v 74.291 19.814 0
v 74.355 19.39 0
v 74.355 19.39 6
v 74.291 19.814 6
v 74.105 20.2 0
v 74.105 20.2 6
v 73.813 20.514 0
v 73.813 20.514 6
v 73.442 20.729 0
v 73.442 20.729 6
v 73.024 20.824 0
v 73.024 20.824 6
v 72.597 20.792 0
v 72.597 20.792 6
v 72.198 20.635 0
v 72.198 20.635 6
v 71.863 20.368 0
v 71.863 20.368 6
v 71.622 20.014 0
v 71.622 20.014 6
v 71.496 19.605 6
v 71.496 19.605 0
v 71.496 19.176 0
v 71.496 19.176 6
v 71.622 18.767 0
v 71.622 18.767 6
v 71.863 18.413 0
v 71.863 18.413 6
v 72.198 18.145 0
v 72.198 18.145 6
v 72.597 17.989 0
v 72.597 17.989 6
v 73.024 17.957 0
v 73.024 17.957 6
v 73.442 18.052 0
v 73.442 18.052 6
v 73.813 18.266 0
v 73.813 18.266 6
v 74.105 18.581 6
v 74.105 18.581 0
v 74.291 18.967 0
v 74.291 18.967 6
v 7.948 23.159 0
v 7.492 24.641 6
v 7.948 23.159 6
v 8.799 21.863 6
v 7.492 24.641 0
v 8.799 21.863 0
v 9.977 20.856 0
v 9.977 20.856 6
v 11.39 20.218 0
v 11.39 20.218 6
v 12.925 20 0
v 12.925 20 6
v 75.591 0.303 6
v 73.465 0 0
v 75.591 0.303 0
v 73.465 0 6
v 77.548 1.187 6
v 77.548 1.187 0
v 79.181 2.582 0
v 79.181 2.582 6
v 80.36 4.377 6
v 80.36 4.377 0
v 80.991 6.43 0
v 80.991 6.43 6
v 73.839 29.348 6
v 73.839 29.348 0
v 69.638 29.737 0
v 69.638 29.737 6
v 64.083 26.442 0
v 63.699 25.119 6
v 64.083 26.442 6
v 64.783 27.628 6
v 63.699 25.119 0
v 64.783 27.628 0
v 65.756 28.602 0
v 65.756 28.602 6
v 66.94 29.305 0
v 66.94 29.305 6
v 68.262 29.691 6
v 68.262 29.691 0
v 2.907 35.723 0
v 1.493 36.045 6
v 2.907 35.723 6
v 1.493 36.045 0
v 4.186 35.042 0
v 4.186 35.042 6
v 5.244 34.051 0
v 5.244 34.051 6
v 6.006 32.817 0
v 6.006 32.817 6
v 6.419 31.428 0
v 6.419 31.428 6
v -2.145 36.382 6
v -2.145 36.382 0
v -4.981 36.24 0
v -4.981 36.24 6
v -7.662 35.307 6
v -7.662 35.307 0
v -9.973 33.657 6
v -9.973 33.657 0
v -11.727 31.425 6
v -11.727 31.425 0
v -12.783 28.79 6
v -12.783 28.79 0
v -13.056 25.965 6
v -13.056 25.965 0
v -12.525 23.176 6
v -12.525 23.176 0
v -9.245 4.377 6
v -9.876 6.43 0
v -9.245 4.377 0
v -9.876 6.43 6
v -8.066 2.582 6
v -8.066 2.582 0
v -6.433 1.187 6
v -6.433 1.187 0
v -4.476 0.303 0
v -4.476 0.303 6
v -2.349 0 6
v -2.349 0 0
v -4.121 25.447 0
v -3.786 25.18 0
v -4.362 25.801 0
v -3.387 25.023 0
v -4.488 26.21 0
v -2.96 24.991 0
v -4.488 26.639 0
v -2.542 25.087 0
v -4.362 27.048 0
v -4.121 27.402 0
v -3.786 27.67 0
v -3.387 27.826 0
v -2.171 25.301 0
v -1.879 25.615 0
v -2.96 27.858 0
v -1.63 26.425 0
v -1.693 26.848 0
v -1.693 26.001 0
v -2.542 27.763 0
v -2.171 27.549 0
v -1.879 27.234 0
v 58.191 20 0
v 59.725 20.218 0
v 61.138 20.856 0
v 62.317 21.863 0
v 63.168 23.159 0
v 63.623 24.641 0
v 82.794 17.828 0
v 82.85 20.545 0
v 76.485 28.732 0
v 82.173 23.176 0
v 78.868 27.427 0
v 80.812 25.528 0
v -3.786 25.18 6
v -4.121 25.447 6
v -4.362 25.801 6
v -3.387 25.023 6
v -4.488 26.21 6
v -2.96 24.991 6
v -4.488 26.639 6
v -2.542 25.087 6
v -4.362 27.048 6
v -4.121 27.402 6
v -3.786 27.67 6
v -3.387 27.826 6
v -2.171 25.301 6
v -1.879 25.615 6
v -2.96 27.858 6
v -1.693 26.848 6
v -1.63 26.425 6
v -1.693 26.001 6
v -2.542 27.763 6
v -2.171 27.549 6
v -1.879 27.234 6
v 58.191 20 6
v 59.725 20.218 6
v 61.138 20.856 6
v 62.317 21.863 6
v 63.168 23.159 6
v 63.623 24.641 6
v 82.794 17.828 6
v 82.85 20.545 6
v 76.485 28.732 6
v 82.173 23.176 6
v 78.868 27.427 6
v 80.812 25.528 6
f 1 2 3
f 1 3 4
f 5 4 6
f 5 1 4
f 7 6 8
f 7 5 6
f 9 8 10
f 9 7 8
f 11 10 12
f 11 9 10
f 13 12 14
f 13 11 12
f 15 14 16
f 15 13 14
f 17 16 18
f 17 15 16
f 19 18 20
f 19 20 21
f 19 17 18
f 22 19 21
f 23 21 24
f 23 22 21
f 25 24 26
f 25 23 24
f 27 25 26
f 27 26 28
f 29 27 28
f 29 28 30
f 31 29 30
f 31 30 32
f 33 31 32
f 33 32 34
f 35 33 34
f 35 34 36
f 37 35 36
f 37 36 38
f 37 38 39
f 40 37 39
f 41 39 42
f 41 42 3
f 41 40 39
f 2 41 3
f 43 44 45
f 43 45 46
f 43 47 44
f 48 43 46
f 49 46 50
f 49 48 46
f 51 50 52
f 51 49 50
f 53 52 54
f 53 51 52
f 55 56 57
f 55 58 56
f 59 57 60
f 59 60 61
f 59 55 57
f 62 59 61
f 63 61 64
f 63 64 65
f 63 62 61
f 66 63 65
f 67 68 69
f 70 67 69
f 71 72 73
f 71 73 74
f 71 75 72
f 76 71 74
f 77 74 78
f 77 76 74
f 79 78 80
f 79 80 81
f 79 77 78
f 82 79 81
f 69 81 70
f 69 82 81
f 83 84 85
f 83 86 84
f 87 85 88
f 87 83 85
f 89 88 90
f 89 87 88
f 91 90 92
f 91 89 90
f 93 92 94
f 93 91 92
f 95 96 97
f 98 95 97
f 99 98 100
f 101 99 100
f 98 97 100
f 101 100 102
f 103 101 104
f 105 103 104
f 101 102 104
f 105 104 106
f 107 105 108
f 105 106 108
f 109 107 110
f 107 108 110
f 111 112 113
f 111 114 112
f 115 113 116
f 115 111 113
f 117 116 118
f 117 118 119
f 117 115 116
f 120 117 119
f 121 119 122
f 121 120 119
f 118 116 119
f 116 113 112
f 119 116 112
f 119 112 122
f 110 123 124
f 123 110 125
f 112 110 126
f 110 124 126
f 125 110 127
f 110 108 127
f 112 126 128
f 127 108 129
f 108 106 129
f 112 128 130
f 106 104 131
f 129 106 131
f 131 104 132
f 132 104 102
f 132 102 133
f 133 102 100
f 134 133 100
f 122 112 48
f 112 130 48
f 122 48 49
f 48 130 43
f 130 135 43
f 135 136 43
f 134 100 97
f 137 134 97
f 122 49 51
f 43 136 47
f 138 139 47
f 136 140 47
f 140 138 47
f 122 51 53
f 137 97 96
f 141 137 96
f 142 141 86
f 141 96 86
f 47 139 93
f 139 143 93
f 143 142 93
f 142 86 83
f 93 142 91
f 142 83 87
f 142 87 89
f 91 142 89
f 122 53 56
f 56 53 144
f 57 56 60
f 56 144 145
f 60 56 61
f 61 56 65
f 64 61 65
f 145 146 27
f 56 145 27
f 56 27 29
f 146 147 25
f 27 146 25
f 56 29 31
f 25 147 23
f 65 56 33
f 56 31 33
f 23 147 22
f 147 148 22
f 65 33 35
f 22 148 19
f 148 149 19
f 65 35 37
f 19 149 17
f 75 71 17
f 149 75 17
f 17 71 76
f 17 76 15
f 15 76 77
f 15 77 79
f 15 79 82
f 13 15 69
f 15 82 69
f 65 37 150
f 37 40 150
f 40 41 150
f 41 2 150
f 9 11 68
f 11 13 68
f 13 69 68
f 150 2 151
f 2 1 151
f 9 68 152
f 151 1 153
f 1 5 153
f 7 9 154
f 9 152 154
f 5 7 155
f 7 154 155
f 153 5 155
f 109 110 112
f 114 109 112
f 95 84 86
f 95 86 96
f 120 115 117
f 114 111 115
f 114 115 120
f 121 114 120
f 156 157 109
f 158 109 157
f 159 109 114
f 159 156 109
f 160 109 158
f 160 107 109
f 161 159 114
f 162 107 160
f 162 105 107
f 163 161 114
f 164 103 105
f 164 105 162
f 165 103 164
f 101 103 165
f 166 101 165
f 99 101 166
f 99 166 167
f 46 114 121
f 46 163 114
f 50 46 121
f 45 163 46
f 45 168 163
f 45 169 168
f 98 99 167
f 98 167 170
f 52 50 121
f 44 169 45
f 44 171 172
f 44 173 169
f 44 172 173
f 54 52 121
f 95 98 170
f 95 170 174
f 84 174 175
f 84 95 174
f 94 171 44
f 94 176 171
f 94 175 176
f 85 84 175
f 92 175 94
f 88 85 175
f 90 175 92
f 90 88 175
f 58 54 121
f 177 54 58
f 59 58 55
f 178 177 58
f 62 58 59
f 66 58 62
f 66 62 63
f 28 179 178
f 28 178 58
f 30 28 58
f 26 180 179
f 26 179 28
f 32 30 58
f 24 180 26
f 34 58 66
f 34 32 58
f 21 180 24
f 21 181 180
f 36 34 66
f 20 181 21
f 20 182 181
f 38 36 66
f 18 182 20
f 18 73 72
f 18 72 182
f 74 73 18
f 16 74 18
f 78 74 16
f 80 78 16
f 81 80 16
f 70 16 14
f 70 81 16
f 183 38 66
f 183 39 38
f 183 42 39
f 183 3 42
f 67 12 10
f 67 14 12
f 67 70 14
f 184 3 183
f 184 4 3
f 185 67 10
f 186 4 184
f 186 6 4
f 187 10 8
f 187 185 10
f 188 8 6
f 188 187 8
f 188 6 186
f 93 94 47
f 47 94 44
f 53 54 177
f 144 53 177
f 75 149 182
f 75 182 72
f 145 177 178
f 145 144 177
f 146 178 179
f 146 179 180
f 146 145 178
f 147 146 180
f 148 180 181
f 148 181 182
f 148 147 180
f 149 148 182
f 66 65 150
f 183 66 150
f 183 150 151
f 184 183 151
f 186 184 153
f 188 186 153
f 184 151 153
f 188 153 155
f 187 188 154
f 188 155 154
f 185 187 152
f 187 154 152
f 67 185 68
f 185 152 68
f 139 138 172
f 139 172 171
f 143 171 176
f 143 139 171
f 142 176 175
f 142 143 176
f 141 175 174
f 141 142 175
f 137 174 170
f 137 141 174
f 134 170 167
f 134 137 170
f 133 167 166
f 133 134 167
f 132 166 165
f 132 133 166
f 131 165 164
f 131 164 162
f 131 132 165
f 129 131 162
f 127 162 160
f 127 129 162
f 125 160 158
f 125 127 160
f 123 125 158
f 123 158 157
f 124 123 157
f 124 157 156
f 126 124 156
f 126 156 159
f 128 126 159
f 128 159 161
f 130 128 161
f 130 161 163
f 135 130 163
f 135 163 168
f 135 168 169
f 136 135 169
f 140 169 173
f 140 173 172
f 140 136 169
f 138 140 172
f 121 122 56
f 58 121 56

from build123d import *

# Parameters (mm, degrees)
SKETCH1_R           = 1.4375
BOSS_EXTRUDE1_DEPTH = 5.999988
FILLET3_R           = 7.62
CUT_EXTRUDE2_DEPTH  = 91.763371988
FILLET5_R           = 5.5


with BuildPart() as part:
    # Sketch1 → Boss-Extrude1 (new body)
    # profile 1 of 2: a face of its own
    with BuildSketch(Plane.XY):
        with BuildLine():
            Line((-12.524548321, 23.175850862), (-8.858779162, 0))
            Line((-8.858779162, 0), (79.974319043, 0))
            Line((79.974319043, 0), (82.794220418, 17.828076701))
            ThreePointArc((82.794220418, 17.828076701), (80.81199482, 25.527902595), (73.838835056, 29.347795267))
            Line((73.838835056, 29.347795267), (-2.145190776, 36.382122067))
            ThreePointArc((-2.145190776, 36.382122067), (4.322784828, 33.16197662), (6.932987084, 26.424700516))
            ThreePointArc((6.932987084, 26.424700516), (6.181465859, 22.621328283), (4.039859015, 19.389619041))
            ThreePointArc((4.039859015, 19.389619041), (3.875471285, 19.227345924), (3.707379331, 19.06891302))
            ThreePointArc((3.707379331, 19.06891302), (-5.519878365, 16.730194284), (-12.524548321, 23.175850862))
        make_face()
        with Locations((72.917012916, 19.390373716)):
            Circle(SKETCH1_R, mode=Mode.SUBTRACT)
    # profile 2 of 2: a face of its own
    with BuildSketch(Plane.XY):
        with BuildLine():
            ThreePointArc((-2.145190776, 36.382122067), (-10.929328098, 32.604020866), (-12.524548321, 23.175850862))
            ThreePointArc((-12.524548321, 23.175850862), (-5.519878365, 16.730194284), (3.707379331, 19.06891302))
            ThreePointArc((3.707379331, 19.06891302), (3.875471285, 19.227345924), (4.039859015, 19.389619041))
            ThreePointArc((4.039859015, 19.389619041), (6.181465859, 22.621328283), (6.932987084, 26.424700516))
            ThreePointArc((6.932987084, 26.424700516), (4.322784828, 33.16197662), (-2.145190776, 36.382122067))
        make_face()
        with Locations((-3.067012916, 26.424700516)):
            Circle(SKETCH1_R, mode=Mode.SUBTRACT)
    extrude(amount=BOSS_EXTRUDE1_DEPTH)

    # Fillet3
    fillet3_edges = [part.edges().sort_by_distance(p)[0] for p in [
        (79.974319043, 0, 2.999994),
        (-8.858779162, 0, 2.999994),
    ]]
    fillet(fillet3_edges, radius=FILLET3_R)

    # Sketch3 → Cut-Extrude2 (cut, through all)
    with BuildSketch(Plane.XY.offset(5.999988)):
        Polygon((5.750849923, 35.651135125), (8.226420239, 20), (62.889119642, 20), (64.504363049, 30.211946987), align=None)
    extrude(amount=-CUT_EXTRUDE2_DEPTH, mode=Mode.SUBTRACT)

    # Fillet5
    fillet5_edges = [part.edges().sort_by_distance(p)[0] for p in [
        (5.750849923, 35.651135125, 2.999994),
        (64.504363049, 30.211946987, 2.999994),
        (62.889119642, 20, 2.999994),
        (8.226420239, 20, 2.999994),
    ]]
    fillet(fillet5_edges, radius=FILLET5_R)


solid = part.part
